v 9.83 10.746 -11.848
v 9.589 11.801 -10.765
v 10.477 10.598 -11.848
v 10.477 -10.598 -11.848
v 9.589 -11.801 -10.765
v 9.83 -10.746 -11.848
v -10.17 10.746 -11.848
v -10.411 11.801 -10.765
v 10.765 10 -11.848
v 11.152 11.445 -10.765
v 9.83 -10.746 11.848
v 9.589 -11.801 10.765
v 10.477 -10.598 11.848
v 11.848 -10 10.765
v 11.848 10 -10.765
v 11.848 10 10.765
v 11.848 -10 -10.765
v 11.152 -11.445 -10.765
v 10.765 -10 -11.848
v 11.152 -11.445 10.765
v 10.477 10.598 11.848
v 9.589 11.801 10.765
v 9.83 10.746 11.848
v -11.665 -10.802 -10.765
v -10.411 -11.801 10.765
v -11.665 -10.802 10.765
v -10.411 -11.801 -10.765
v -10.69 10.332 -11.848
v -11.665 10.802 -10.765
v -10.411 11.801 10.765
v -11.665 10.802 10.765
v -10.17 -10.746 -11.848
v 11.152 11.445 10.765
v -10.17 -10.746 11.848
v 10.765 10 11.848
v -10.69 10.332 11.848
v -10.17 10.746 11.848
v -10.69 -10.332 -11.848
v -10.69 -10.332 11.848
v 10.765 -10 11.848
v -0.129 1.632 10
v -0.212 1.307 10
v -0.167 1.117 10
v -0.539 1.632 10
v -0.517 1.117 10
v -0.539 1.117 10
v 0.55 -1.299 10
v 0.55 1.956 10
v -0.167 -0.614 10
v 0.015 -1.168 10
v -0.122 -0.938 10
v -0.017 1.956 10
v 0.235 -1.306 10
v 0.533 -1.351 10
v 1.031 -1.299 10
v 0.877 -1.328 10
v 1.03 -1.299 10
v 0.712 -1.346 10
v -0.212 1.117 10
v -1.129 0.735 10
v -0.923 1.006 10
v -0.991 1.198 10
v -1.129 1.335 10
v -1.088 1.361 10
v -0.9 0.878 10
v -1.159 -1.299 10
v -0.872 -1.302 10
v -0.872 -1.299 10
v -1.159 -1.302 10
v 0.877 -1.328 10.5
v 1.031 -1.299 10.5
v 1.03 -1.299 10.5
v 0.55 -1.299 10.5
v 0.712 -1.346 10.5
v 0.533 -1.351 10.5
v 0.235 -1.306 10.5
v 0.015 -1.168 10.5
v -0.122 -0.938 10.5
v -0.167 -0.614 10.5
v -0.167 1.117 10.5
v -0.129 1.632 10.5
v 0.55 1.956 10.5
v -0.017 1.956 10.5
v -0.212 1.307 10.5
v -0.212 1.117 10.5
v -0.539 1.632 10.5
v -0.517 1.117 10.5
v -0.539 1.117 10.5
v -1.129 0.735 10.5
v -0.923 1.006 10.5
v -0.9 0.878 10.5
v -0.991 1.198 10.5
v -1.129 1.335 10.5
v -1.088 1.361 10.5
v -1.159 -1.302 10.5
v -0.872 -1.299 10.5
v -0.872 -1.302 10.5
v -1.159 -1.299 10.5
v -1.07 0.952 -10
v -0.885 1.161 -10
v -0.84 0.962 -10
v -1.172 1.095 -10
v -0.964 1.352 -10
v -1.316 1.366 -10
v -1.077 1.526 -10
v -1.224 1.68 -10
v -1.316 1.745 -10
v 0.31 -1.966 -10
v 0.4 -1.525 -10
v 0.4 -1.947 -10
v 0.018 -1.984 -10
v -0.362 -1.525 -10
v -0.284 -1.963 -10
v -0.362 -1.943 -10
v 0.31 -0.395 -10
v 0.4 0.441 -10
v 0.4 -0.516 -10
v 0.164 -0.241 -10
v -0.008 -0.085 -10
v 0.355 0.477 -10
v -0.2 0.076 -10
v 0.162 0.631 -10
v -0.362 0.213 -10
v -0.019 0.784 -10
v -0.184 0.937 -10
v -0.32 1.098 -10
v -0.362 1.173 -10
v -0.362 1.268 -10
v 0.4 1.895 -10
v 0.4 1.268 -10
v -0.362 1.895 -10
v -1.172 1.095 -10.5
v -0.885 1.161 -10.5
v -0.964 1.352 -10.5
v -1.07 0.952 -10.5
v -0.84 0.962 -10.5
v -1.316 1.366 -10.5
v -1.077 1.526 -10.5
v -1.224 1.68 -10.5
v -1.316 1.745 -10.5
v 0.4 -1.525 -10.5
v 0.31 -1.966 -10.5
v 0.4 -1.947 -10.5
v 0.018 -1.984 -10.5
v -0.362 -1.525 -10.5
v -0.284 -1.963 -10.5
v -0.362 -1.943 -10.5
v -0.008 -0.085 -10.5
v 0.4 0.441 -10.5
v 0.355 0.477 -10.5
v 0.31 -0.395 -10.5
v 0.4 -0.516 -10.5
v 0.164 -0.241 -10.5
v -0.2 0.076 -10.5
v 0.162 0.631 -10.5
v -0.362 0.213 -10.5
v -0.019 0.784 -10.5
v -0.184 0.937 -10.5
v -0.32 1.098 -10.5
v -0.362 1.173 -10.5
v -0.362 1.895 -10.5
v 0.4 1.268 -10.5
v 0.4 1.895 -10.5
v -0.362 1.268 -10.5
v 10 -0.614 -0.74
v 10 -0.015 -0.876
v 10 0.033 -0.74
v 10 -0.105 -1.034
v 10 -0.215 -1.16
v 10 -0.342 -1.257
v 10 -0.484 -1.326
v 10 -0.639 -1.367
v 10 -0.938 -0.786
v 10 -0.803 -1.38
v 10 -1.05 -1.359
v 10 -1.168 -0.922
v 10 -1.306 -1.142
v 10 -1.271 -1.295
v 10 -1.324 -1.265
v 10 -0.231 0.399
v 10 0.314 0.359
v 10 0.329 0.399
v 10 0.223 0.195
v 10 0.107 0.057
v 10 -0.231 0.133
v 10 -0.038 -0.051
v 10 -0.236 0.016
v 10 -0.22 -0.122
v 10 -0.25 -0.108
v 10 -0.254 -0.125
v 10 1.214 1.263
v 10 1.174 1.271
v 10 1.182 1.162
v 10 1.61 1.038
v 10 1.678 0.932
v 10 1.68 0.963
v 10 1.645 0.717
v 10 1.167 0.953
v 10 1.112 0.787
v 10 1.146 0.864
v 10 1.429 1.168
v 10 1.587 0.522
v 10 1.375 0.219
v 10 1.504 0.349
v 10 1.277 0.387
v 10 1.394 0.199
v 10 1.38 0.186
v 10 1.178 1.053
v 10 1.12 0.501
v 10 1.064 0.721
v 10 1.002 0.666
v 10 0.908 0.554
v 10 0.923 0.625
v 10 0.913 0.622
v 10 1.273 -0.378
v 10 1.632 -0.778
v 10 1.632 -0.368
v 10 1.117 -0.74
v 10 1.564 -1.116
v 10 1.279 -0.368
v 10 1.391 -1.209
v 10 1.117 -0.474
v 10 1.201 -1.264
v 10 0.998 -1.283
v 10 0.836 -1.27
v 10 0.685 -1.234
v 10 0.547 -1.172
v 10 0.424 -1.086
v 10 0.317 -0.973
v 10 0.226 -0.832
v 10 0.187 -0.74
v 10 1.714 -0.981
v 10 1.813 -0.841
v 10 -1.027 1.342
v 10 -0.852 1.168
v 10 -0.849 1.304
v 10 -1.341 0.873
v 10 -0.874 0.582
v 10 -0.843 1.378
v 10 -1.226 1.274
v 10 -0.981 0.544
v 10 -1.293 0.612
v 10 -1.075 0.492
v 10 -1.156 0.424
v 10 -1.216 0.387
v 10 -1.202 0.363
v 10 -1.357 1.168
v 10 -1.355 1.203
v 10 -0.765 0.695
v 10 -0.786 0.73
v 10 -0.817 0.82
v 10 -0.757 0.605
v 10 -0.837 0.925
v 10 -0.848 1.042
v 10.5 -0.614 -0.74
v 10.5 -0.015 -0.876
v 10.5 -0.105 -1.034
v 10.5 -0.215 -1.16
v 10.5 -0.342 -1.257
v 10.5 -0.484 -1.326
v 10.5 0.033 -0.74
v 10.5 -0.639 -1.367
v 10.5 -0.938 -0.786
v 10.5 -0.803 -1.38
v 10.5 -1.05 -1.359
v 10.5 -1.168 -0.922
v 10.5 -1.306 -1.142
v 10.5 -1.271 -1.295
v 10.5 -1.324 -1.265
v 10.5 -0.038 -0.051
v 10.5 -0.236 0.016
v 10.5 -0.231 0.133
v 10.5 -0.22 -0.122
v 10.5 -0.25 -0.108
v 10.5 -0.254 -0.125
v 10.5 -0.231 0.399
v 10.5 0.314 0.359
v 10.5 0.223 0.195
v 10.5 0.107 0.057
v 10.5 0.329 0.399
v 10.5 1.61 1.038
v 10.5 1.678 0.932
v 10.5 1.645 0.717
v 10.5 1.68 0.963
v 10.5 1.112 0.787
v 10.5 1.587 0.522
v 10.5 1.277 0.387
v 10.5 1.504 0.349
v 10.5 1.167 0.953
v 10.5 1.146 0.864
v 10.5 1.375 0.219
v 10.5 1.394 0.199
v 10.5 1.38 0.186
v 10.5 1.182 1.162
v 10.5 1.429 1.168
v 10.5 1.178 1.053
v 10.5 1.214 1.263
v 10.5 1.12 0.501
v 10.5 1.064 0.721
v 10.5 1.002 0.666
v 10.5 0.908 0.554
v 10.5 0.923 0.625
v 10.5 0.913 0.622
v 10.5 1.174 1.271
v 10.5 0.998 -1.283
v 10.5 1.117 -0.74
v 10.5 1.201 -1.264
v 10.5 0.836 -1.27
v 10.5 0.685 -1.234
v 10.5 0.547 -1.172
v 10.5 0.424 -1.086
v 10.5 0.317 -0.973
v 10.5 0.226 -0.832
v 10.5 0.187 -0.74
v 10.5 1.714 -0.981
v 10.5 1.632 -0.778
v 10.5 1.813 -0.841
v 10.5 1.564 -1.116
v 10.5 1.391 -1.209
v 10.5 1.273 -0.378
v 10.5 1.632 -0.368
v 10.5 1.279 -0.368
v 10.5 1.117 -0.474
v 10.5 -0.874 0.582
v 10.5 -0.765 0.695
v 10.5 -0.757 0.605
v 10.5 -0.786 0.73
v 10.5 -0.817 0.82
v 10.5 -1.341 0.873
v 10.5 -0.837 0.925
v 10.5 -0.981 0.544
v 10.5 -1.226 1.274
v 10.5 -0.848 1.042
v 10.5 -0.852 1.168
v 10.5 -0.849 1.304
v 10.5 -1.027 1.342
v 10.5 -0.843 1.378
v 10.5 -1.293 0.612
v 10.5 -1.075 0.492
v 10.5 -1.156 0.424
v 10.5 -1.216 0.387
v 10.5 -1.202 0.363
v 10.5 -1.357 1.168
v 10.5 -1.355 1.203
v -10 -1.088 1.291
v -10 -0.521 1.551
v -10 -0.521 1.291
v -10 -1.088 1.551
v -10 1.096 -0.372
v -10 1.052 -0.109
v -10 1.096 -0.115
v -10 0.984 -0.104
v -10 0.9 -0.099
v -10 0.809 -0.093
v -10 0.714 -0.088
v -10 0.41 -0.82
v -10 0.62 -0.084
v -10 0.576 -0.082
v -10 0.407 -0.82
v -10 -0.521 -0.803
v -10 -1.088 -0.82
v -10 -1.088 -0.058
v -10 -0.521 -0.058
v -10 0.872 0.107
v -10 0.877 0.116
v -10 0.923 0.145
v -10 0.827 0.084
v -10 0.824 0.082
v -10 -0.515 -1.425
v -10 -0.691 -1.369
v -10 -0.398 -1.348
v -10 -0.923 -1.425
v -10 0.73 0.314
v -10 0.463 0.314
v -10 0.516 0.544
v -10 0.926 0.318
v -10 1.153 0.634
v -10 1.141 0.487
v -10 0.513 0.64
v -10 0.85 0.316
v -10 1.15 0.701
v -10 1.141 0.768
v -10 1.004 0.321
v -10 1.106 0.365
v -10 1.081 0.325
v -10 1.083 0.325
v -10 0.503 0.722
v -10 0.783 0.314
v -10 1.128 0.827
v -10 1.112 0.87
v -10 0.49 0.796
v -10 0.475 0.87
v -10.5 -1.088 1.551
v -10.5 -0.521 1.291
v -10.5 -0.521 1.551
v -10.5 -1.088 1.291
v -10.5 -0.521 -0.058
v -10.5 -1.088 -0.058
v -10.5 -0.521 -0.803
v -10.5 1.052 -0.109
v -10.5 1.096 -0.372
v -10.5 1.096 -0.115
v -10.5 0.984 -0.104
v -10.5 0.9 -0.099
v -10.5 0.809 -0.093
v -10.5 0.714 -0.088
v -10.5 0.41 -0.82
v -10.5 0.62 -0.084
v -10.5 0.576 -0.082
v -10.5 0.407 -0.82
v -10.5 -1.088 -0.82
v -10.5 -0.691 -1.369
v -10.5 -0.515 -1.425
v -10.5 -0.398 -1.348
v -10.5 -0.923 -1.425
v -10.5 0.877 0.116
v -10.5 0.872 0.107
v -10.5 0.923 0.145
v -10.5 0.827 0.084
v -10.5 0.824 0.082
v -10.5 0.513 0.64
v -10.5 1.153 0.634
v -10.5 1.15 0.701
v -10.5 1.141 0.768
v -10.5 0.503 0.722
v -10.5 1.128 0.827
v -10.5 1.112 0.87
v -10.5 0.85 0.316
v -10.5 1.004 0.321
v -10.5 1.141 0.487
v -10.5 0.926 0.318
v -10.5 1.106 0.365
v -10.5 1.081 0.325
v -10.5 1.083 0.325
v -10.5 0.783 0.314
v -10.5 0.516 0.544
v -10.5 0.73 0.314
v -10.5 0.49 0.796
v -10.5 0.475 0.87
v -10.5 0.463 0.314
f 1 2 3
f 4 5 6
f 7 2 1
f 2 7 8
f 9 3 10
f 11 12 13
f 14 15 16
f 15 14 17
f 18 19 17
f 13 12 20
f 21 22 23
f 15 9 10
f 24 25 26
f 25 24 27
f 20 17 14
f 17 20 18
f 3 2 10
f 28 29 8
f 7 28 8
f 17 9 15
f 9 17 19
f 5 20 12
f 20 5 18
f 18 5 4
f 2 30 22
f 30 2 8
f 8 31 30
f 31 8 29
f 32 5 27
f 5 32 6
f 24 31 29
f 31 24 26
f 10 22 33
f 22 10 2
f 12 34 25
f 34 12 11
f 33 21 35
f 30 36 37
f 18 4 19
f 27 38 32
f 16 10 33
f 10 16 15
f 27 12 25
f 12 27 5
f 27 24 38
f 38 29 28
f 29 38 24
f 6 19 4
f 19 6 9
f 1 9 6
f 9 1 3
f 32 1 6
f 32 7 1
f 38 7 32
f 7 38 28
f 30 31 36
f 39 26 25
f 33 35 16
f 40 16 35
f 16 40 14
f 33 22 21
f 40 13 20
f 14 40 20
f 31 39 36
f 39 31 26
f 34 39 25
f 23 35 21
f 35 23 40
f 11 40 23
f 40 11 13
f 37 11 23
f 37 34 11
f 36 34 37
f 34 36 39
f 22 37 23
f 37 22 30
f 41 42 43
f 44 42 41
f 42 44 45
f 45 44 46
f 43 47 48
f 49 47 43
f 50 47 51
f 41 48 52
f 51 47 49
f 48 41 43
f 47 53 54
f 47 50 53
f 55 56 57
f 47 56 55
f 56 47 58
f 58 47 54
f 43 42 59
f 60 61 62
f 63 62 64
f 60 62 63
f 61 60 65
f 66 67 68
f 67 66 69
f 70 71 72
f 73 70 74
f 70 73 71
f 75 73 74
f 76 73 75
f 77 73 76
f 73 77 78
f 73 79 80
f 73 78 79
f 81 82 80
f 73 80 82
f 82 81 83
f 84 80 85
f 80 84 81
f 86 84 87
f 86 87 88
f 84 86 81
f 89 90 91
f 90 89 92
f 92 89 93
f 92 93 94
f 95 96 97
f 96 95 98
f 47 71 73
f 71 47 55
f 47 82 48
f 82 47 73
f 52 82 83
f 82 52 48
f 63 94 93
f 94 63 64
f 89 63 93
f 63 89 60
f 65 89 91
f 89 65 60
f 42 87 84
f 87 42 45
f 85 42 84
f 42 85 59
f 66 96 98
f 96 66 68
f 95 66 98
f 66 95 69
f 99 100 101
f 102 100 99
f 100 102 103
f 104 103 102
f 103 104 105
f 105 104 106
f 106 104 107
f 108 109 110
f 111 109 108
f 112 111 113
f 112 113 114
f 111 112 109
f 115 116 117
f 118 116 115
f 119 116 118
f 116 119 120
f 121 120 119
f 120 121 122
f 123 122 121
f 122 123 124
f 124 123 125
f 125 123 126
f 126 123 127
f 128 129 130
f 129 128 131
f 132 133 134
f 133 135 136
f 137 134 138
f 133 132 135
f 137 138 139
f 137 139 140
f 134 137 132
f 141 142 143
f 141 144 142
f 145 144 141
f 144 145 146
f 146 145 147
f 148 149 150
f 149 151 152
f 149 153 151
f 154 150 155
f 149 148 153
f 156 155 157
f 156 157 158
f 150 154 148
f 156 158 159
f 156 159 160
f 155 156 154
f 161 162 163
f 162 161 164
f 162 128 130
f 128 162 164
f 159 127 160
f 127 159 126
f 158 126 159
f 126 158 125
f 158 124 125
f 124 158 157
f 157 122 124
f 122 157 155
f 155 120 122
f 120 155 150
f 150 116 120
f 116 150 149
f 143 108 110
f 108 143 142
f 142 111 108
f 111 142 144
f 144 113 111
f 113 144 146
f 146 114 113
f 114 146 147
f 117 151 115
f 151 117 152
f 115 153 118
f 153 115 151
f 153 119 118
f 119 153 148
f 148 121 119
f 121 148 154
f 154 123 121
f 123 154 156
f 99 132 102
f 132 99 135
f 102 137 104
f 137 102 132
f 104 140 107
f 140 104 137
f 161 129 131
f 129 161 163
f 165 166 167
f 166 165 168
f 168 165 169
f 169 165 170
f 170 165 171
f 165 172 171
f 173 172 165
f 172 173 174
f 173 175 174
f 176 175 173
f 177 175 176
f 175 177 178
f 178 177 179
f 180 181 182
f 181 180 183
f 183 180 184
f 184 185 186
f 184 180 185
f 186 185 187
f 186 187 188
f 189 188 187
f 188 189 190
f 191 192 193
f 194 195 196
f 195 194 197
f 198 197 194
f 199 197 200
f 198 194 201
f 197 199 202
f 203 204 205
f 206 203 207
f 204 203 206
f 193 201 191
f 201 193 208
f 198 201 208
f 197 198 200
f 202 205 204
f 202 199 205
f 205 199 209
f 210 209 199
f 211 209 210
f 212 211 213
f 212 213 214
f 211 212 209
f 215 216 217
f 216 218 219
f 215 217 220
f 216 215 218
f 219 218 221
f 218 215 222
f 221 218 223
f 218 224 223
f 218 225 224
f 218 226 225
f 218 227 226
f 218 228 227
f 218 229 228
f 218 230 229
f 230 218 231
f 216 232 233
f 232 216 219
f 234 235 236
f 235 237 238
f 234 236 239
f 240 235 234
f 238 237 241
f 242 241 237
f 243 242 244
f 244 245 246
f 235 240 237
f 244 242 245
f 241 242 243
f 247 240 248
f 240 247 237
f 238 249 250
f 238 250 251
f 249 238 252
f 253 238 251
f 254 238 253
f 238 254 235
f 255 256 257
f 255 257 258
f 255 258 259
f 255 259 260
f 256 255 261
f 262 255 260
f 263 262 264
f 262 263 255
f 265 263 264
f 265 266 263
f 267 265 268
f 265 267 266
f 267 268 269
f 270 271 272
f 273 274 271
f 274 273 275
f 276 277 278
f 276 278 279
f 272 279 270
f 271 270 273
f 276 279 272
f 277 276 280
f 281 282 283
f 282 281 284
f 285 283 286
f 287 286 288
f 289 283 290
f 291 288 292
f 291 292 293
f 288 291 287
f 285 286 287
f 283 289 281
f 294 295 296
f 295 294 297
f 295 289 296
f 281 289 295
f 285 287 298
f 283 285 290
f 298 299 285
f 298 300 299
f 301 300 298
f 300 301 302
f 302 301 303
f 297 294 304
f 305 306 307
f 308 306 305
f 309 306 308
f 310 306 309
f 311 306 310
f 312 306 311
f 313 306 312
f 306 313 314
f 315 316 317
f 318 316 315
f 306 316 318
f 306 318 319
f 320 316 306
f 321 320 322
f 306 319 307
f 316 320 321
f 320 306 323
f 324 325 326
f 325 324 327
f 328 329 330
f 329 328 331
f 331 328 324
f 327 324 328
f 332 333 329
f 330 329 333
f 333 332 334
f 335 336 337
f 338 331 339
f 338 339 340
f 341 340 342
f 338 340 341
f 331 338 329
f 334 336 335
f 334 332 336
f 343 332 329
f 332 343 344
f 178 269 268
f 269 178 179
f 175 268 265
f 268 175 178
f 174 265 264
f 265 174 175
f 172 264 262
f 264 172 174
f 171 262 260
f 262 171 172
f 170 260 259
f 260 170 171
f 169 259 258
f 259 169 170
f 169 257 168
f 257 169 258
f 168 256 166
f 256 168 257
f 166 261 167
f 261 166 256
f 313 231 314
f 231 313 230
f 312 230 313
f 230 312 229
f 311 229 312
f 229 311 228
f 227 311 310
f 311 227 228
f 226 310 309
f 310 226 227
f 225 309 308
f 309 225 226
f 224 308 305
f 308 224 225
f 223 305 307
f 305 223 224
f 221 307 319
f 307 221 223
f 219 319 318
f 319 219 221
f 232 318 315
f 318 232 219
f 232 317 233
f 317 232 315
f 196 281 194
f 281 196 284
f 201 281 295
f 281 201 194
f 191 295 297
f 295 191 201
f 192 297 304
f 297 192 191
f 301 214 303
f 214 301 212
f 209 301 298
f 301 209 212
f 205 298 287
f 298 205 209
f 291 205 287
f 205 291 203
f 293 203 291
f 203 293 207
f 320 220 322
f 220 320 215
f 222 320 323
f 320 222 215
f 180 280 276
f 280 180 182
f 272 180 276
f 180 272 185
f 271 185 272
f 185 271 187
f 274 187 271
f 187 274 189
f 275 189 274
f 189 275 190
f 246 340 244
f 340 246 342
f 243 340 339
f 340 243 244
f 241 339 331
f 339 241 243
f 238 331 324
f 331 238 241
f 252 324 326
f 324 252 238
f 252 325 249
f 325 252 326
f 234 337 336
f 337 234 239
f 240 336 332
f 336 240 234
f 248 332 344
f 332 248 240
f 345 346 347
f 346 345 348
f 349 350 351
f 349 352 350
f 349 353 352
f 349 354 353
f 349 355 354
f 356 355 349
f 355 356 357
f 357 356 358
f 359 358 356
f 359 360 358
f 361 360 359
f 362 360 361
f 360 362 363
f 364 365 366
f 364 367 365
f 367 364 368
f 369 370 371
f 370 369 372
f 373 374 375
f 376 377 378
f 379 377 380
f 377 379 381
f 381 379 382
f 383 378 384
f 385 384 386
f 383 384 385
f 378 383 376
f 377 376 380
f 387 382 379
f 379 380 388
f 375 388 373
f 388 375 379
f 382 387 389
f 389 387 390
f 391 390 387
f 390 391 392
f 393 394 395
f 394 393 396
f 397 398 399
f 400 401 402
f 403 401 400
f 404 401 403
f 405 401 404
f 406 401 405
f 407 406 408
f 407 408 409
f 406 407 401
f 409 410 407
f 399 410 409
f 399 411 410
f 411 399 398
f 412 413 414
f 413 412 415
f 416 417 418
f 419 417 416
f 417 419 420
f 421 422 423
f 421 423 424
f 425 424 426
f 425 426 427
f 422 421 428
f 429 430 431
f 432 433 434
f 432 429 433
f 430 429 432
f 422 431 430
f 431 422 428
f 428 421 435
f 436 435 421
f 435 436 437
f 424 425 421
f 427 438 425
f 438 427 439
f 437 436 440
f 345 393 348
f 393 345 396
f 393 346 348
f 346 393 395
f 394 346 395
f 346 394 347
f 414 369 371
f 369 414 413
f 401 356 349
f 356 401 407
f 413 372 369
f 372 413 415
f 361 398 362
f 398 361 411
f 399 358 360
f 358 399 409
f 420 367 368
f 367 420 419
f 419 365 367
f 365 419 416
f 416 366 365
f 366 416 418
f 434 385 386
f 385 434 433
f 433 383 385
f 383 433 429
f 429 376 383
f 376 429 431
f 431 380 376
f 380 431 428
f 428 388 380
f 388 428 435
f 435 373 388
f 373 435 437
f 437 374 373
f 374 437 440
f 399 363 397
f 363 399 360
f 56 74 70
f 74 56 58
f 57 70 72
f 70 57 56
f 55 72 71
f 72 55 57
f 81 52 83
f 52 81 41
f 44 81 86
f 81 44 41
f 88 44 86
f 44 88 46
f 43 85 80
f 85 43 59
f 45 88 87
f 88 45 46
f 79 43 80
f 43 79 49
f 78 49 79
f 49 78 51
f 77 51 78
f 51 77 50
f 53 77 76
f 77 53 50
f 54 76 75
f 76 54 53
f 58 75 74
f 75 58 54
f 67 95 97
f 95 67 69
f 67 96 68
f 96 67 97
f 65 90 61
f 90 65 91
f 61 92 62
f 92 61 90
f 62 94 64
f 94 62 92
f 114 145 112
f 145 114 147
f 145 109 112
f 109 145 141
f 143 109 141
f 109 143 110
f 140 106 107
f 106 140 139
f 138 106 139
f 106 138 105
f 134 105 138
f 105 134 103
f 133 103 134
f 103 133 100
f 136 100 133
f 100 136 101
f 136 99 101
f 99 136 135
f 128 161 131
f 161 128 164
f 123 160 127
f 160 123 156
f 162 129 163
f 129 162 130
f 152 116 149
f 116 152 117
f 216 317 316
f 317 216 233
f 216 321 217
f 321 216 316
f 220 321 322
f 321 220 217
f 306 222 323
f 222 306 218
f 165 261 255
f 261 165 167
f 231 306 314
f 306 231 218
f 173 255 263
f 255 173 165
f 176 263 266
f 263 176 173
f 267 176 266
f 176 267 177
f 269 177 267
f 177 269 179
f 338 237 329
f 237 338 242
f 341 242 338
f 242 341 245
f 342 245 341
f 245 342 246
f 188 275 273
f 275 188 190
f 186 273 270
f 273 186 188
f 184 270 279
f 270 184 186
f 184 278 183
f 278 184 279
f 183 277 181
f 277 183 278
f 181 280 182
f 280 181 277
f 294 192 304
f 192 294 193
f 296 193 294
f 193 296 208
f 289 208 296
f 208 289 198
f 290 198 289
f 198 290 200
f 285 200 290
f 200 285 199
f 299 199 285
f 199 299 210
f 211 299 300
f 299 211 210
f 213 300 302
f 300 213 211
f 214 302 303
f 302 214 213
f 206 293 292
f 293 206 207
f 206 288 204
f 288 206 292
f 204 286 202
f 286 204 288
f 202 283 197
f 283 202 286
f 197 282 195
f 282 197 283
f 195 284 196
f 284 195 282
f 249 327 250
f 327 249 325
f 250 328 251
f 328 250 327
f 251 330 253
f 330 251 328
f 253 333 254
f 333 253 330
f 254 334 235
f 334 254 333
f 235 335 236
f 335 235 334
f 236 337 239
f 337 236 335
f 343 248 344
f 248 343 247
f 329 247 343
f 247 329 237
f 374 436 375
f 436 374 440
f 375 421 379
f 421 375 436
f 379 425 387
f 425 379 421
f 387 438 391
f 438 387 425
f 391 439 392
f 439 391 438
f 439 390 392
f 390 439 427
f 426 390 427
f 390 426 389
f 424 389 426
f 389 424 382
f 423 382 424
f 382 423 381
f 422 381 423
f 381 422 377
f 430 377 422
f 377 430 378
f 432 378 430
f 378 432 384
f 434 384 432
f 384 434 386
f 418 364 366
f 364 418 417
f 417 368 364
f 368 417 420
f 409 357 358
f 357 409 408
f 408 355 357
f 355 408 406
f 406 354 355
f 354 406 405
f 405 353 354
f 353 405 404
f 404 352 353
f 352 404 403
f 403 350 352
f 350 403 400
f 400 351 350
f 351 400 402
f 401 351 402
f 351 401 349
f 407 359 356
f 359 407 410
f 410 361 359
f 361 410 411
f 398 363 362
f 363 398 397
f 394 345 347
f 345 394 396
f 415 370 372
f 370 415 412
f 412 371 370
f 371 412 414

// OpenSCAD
// file: die.scad
extrusion_height = 0.5;

module die(labels = ["1", "2", "3", "4", "5", "6"]) {
  difference() {
    minkowski() {
      cube([20, 20, 20], center=true);
      sphere(2);
    }
    translate([0, 0, 10])
      rotate([0, 0, 0])
        linear_extrude(height=extrusion_height)
          text(labels[0], size=4, halign="center", valign="center", font="Arial:style=Bold");
    translate([0, 0, -10])
      rotate([180, 0, 0])
        linear_extrude(height=extrusion_height)
          text(labels[1], size=4, halign="center", valign="center", font="Arial:style=Bold");
    translate([10, 0, 0])
      rotate([0, 90, 0])
        linear_extrude(height=extrusion_height)
          text(labels[2], size=4, halign="center", valign="center", font="Arial:style=Bold");
    translate([-10, 0, 0])
      rotate([0, -90, 0])
        linear_extrude(height=extrusion_height)
          text(labels[3], size=4, halign="center", valign="center", font="Arial:style=Bold");
    translate([0, 13, 0])
      rotate([90, 0, 0])
        mirror([1, 0, 0])
          linear_extrude(height=extrusion_height)
            text(labels[4], size=4, halign="center", valign="center", font="Arial:style=Bold");
    translate([0, -13, 0])
      rotate([-90, 0, 0])
        mirror([1, 0, 0])
          linear_extrude(height=extrusion_height)
            text(labels[5], size=4, halign="center", valign="center", font="Arial:style=Bold");
  }
}

die();
// main file
include <die.scad>

die(["Fantasy", "Sci-Fi", "Mystery", "Horror", "Romance", "Life"]);
